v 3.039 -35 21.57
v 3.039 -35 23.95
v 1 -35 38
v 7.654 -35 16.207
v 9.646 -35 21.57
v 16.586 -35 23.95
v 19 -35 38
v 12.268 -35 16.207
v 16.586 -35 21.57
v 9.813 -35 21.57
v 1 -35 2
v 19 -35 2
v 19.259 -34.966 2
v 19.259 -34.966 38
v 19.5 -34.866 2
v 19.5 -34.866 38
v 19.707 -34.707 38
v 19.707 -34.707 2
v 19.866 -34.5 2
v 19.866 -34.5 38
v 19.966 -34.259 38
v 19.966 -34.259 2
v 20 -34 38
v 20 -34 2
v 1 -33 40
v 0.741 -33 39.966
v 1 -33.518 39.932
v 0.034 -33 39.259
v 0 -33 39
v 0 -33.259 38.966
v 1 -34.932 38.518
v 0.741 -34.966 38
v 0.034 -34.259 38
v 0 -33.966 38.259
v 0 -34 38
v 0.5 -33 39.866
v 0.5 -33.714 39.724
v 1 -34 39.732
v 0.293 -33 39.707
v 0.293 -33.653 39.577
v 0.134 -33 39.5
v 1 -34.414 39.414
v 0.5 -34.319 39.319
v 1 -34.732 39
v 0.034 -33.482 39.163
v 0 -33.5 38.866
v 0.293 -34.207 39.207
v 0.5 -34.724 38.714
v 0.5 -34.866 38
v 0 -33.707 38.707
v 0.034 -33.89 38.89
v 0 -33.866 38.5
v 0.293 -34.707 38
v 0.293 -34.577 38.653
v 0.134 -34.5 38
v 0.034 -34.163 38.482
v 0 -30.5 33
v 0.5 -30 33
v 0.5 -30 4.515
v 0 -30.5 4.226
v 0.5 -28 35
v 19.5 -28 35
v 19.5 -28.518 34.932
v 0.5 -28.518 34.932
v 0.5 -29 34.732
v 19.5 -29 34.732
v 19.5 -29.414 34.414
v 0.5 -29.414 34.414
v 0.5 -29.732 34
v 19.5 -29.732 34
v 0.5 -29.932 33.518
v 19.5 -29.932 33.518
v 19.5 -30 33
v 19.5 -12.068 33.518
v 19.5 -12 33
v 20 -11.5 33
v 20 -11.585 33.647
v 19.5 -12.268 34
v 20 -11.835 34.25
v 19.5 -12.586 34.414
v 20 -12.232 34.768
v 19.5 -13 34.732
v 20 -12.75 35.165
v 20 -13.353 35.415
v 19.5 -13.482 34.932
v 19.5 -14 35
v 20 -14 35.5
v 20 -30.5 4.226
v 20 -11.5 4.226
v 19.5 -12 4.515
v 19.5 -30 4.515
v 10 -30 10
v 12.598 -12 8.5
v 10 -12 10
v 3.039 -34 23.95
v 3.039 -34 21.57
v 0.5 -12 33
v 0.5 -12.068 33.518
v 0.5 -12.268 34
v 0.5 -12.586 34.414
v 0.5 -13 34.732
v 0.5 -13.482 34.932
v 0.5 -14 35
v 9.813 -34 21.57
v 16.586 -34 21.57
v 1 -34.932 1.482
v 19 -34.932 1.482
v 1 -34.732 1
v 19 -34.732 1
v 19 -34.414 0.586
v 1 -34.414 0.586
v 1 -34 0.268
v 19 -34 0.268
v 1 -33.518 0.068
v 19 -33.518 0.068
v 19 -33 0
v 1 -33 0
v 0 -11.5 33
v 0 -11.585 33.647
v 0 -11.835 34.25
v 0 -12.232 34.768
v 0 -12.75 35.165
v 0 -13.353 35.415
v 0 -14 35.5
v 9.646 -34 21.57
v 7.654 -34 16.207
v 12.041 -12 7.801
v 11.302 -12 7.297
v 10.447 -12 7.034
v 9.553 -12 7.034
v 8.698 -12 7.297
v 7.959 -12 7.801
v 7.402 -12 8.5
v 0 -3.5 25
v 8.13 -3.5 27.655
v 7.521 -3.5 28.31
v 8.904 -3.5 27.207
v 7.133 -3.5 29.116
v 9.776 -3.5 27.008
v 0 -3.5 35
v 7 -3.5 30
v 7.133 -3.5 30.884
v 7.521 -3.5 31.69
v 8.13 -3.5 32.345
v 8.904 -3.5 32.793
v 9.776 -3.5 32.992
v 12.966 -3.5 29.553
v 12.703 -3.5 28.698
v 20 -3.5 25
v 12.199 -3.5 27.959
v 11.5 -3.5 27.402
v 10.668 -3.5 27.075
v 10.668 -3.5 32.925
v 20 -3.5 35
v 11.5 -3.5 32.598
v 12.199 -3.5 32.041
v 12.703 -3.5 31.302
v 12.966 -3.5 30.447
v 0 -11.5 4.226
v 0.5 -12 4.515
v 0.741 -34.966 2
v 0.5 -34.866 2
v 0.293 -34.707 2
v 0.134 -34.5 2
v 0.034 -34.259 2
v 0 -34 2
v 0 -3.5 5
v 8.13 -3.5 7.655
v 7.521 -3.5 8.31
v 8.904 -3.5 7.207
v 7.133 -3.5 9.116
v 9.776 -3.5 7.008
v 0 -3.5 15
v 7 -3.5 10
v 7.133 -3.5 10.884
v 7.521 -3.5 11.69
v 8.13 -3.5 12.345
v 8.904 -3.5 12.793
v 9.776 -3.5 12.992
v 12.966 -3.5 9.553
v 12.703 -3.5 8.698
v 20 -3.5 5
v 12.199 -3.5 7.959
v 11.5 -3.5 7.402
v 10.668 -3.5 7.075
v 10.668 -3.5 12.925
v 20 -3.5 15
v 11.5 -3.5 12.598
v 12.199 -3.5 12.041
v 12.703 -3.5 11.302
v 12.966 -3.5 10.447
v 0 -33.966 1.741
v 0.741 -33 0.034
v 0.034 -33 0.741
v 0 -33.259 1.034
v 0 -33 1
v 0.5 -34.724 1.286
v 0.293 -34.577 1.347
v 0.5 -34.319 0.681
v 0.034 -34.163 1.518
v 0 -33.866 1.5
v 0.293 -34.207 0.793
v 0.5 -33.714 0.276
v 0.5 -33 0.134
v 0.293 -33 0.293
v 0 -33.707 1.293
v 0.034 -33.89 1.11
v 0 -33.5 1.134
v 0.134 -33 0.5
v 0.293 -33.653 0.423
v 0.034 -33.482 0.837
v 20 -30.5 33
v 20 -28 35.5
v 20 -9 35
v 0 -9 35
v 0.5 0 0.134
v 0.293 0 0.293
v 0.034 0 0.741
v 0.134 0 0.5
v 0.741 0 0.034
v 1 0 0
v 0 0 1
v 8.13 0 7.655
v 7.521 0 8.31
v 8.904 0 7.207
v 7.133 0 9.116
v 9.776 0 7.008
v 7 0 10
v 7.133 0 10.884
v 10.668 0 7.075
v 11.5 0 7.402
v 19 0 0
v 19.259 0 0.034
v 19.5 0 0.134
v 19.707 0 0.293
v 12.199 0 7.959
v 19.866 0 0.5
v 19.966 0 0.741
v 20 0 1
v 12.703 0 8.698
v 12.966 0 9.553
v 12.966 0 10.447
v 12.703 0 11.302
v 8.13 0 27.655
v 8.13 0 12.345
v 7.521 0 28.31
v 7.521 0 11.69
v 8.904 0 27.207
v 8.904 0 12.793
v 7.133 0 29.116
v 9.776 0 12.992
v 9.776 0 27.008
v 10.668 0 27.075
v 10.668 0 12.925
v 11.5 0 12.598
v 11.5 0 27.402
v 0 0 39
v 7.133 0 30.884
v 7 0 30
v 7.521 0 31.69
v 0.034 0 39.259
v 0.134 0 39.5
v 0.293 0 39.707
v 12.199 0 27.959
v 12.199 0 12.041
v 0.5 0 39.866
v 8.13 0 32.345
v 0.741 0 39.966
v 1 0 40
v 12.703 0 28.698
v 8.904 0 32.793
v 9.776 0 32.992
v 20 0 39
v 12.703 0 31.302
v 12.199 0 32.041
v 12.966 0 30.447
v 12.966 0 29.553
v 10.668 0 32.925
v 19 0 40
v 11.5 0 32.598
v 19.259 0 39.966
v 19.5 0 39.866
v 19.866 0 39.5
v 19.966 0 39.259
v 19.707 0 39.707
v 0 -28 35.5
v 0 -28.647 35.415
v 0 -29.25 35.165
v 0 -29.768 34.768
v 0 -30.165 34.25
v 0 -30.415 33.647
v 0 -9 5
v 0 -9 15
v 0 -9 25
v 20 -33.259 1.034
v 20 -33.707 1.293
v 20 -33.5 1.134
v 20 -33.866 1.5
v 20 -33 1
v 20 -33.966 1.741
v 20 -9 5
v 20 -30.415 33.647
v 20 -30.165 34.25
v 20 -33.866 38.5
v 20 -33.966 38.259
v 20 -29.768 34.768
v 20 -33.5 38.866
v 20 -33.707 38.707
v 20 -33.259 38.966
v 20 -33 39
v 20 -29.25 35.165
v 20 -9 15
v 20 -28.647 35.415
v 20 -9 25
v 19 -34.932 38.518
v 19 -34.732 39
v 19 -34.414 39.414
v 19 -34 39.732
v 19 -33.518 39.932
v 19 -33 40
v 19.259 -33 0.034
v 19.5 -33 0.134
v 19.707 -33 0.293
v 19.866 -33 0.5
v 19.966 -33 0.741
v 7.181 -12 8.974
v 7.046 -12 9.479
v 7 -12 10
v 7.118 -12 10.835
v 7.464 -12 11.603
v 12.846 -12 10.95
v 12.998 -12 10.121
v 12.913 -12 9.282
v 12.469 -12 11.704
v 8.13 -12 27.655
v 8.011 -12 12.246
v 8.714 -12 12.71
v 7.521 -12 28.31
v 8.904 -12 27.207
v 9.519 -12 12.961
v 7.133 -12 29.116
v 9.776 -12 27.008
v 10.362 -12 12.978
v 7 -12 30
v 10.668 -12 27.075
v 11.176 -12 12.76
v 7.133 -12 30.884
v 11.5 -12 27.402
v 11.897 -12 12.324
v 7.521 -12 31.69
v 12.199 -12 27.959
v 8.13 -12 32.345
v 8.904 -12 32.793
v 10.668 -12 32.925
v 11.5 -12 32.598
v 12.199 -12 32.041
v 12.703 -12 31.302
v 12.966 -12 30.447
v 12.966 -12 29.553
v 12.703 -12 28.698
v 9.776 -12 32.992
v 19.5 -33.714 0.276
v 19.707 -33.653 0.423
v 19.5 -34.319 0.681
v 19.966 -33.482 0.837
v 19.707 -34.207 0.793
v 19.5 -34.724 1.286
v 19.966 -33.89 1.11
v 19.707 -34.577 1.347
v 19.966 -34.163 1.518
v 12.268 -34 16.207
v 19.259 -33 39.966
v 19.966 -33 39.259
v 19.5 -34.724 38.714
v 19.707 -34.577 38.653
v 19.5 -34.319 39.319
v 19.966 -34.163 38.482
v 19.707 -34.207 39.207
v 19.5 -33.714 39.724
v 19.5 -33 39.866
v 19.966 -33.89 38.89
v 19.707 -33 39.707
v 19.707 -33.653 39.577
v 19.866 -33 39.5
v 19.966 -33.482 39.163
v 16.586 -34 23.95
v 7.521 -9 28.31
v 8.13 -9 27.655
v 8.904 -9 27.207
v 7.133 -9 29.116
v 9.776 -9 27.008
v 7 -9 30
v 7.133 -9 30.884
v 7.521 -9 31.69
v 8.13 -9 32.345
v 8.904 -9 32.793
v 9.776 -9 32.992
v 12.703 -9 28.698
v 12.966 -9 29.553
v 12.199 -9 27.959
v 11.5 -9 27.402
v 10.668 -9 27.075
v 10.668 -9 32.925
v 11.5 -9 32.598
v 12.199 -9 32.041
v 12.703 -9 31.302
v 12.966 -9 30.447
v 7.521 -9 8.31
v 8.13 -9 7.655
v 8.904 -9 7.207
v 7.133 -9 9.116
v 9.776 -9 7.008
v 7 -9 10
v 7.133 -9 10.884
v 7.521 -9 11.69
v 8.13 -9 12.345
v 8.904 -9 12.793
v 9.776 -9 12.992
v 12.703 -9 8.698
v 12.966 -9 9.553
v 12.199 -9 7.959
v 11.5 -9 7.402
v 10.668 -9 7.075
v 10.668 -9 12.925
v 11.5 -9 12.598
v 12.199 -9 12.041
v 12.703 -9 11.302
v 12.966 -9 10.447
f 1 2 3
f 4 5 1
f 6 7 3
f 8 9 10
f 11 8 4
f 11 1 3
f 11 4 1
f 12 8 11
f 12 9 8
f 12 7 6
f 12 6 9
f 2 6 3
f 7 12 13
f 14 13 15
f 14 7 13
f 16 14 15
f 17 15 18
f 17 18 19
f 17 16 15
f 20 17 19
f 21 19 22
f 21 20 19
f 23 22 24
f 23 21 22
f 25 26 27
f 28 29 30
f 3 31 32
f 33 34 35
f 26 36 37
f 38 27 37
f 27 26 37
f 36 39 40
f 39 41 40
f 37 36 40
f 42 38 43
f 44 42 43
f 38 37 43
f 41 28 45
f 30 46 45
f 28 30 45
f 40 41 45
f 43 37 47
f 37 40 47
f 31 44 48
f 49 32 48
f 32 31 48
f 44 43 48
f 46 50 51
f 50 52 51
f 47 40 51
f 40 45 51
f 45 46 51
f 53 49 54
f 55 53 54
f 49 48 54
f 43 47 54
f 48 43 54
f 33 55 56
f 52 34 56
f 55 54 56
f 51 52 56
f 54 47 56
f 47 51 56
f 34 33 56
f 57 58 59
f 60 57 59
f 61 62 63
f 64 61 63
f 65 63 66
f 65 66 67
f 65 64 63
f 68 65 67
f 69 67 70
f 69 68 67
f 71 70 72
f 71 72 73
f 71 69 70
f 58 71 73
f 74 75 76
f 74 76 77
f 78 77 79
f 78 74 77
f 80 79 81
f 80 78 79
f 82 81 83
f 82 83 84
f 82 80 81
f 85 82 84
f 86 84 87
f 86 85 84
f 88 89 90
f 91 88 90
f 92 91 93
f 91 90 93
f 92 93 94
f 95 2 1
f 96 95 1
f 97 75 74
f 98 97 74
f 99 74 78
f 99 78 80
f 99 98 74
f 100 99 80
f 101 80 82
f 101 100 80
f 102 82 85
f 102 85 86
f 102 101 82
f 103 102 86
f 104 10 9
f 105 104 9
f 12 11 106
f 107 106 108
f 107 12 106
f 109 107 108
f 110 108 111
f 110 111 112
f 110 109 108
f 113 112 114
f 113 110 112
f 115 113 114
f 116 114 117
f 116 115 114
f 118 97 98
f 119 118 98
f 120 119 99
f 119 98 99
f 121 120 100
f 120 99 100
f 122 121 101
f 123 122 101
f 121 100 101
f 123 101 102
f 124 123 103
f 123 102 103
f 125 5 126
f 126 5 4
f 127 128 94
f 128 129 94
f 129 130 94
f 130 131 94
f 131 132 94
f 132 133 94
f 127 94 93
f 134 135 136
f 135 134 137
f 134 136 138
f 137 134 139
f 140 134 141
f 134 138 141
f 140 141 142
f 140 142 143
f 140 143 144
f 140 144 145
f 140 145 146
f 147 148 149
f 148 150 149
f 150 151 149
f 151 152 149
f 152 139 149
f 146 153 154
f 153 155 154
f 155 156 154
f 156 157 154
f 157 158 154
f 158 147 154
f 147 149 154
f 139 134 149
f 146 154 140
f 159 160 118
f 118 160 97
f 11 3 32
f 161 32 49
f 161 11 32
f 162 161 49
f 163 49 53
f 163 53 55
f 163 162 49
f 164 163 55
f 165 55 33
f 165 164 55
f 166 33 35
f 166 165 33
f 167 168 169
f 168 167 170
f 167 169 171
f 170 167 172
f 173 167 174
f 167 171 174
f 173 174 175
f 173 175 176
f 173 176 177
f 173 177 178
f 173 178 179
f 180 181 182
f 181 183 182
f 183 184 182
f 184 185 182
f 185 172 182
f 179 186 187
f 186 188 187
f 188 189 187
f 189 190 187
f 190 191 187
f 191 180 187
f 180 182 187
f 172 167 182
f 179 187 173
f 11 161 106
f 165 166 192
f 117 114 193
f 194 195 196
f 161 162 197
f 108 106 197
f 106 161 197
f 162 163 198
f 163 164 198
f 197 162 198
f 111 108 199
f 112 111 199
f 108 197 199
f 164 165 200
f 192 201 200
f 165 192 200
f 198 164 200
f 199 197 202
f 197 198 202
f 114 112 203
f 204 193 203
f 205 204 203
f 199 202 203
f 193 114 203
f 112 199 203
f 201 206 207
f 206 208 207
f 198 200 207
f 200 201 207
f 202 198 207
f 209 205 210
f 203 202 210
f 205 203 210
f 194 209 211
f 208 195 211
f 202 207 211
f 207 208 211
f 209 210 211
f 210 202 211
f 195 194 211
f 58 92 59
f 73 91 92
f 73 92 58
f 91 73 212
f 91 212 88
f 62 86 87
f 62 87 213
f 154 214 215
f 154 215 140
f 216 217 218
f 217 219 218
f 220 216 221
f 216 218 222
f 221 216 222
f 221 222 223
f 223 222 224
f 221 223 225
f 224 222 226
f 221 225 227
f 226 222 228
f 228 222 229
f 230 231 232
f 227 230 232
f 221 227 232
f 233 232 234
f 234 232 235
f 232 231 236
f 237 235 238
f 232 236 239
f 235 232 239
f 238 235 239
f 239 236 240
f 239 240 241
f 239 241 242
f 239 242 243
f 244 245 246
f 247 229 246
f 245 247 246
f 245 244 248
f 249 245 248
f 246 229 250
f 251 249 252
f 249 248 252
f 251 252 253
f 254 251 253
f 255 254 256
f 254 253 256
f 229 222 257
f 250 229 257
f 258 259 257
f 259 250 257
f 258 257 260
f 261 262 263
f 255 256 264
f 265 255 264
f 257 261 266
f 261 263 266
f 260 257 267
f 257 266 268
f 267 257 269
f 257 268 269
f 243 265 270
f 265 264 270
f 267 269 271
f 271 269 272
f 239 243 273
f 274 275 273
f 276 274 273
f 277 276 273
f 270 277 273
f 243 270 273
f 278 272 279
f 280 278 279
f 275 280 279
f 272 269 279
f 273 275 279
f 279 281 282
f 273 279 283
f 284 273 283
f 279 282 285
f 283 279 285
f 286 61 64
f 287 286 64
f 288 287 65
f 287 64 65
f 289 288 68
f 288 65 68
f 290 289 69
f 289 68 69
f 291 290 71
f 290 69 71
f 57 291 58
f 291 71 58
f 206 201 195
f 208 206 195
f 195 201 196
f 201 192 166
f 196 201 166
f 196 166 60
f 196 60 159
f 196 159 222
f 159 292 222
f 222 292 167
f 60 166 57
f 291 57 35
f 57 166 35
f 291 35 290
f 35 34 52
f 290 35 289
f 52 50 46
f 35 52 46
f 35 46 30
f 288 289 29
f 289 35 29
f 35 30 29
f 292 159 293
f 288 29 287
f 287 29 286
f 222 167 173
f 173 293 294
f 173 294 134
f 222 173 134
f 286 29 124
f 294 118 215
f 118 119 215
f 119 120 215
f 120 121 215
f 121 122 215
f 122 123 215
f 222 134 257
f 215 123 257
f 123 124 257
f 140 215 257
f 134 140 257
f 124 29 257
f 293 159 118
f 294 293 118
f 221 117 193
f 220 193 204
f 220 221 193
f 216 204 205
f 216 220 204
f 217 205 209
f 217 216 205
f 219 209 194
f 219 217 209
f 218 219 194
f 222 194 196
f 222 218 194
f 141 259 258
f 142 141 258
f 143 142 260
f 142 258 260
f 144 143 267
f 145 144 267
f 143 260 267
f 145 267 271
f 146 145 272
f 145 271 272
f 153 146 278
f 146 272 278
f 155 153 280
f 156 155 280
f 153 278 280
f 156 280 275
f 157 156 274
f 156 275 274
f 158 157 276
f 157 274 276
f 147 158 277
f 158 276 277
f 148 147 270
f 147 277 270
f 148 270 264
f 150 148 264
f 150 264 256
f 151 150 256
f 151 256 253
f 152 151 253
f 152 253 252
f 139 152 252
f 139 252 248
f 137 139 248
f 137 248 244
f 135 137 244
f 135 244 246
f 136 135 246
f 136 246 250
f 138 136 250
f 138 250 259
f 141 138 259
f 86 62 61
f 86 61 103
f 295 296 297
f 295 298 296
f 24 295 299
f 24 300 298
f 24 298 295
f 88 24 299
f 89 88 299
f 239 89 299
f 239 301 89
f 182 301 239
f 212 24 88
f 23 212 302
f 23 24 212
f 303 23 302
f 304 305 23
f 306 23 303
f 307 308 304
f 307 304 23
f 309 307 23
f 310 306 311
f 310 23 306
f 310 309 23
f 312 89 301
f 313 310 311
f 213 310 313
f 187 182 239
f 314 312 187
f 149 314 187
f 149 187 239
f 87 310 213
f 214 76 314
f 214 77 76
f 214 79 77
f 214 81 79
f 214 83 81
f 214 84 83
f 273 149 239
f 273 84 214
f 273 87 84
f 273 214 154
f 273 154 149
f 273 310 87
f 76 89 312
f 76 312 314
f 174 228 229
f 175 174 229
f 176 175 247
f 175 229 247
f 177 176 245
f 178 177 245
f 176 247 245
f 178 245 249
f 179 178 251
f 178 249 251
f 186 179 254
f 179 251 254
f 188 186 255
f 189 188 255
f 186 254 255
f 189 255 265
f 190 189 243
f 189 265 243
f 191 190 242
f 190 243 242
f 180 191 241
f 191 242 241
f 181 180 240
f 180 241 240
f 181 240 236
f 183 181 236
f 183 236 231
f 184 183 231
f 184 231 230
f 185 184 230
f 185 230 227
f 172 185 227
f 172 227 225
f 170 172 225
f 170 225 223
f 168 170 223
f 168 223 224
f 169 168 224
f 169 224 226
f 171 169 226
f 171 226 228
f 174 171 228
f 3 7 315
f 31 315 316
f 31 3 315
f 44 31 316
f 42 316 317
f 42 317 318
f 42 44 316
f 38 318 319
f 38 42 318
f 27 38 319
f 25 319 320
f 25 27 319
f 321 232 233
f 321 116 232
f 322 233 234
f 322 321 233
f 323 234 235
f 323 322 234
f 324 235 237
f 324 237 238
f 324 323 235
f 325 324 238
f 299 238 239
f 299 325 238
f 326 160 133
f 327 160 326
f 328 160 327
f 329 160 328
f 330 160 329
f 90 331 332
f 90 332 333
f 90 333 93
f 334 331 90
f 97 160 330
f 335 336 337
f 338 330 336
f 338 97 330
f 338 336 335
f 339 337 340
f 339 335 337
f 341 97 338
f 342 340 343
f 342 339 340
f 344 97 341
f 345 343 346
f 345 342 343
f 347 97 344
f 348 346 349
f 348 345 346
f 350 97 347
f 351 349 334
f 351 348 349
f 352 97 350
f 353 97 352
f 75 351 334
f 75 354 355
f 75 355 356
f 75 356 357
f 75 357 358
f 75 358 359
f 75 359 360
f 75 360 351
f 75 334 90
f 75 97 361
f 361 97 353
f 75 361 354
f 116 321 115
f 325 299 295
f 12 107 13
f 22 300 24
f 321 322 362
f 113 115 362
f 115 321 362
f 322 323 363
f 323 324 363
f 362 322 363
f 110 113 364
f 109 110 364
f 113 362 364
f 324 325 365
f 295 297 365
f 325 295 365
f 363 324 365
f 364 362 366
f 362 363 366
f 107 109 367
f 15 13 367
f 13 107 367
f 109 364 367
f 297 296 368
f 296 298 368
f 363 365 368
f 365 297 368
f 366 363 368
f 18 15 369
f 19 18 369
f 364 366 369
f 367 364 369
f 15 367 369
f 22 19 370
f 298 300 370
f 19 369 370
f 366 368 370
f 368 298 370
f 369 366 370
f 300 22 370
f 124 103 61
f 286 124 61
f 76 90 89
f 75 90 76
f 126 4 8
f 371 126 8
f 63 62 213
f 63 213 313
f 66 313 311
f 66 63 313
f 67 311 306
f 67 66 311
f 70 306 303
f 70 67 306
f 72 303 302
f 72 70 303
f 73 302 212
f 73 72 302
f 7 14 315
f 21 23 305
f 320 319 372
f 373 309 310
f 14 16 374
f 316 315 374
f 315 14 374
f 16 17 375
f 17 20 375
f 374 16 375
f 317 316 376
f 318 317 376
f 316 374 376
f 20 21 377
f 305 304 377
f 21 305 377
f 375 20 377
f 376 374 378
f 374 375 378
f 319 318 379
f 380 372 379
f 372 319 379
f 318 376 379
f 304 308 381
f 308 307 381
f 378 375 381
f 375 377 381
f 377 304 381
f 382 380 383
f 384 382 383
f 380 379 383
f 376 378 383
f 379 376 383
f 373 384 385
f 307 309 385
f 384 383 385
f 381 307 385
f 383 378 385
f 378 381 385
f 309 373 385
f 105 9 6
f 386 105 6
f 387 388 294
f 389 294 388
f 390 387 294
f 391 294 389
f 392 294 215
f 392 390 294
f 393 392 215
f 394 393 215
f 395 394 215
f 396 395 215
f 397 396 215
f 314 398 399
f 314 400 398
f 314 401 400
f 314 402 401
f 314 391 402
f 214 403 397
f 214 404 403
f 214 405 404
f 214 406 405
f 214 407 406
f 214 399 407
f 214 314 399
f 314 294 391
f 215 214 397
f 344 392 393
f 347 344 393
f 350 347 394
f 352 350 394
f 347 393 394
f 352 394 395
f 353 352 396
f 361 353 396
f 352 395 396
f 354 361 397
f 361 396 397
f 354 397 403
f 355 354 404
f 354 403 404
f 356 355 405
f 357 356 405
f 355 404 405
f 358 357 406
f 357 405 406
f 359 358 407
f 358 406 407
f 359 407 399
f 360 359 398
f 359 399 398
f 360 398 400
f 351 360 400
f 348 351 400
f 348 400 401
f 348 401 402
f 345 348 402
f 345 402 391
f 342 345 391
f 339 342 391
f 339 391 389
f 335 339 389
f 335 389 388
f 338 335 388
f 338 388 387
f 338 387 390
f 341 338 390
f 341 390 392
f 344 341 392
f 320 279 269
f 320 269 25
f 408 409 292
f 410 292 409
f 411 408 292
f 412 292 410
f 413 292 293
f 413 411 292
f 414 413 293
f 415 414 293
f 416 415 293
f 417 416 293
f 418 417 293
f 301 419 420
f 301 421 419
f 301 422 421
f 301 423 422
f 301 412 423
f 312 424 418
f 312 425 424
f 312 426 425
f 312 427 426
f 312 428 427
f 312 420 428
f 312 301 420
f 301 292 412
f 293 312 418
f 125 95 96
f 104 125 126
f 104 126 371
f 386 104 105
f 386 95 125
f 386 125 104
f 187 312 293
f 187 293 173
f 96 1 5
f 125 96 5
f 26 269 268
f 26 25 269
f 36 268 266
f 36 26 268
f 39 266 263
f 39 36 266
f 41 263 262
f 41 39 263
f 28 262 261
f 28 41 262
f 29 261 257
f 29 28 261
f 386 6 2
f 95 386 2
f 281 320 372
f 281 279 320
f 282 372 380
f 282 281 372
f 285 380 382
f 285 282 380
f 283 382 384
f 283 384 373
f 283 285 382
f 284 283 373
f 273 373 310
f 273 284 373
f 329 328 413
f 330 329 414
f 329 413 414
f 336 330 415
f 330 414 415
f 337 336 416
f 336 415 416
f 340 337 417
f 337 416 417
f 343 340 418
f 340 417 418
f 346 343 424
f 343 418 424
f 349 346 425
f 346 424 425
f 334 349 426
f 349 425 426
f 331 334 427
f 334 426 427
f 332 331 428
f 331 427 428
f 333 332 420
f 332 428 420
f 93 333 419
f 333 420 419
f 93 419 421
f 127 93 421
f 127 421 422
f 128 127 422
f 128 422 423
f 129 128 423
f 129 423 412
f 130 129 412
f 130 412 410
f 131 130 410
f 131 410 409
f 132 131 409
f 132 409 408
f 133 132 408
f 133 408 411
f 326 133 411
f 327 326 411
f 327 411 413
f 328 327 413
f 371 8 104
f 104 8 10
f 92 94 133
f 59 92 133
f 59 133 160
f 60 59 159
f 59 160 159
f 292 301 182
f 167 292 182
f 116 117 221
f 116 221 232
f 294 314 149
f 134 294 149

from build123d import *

# Parameters (mm, degrees)
F0_W      = 20
F0_H      = 40
F1_DEPTH  = 12
F2_R      = 3
F3_DEPTH  = 12
F5_DEPTH  = 23
F7_DEPTH  = 20
F8_R      = 1.99999
F9_R      = 1
F10_W     = 5.5
F10_H     = 10
F11_DEPTH = 25
F13_DEPTH = 1
F14_SIZE  = 0.5


# Not quite as in the source:
# - a fillet or chamfer is up to 0.001 mm smaller than in the source, because OpenCascade refuses the exact size


with BuildPart() as f1:
    # F0 (on Front) → F1 (new body)
    with BuildSketch(Plane.XZ):
        with Locations((10, 20)):
            Rectangle(F0_W, F0_H)
    extrude(amount=F1_DEPTH)

    # F2 (on face) → F3 (cut, through all)
    with BuildSketch(Plane(origin=(0, 0, 0), x_dir=(-1, 0, 0), z_dir=(0, 1, 0))):
        with Locations((-10, 30)):
            Circle(F2_R)
        with Locations((-10, 10)):
            Circle(F2_R)
    extrude(amount=-F3_DEPTH, mode=Mode.SUBTRACT)

    # F4 (on face) → F5 (join)
    with BuildSketch(Plane.XZ.offset(12)):
        Polygon((0, 4.2264973081), (0, 0), (20, 0), (20, 4.2264973081), (10, 10), align=None)
    extrude(amount=F5_DEPTH)

    # F6 (on face) → F7 (join, through all)
    with BuildSketch(Plane.YZ.offset(20)):
        Polygon((-35, 40), (-35, 4.2264973081), (-30, 4.2264973081), (-30, 35), (-12, 35), (-12, 40), align=None)
    extrude(amount=-F7_DEPTH)

    # F8 (radius 2 in the source; OpenCascade refuses exactly that, so slightly less here)
    f8_edges = [f1.edges().sort_by_distance(p)[0] for p in [
        (10, -35, 40),
        (10, -35, 0),
        (10, -30, 35),
        (10, -12, 35),
    ]]
    fillet(f8_edges, radius=F8_R)

    # F9
    f9_edges = [f1.edges().sort_by_distance(p)[0] for p in [
        (20, -35, 20),
        (0, -35, 20),
    ]]
    fillet(f9_edges, radius=F9_R)

    # F10 (on face) → F11 (cut)
    with BuildSketch(Plane.YZ.offset(20)):
        with Locations((-6.25, 30)):
            Rectangle(F10_W, F10_H)
        with Locations((-6.25, 10)):
            Rectangle(F10_W, F10_H)
    extrude(amount=-F11_DEPTH, mode=Mode.SUBTRACT)

    # F12 (on face) → F13 (cut)
    with BuildSketch(Plane.XZ.offset(35)):
        Polygon((16.5859262925, 23.9497199655), (3.0391060282, 23.9497199655), (3.0391060282, 21.5699486434), (9.6455384046, 21.5699486434), (9.8125161603, 21.5699486434), (16.5859262925, 21.5699486434), align=None)
        Polygon((9.8125161603, 21.5699486434), (9.6455384046, 21.5699486434), (7.6536308043, 16.2067040801), (12.2681558132, 16.2067040801), align=None)
    extrude(amount=-F13_DEPTH, mode=Mode.SUBTRACT)

    # F14
    f14_edges = [f1.edges().sort_by_distance(p)[0] for p in [
        (20, -12, 18.613254),
        (0, -12, 18.613254),
    ]]
    chamfer(f14_edges, length=F14_SIZE)


solid = f1.part
